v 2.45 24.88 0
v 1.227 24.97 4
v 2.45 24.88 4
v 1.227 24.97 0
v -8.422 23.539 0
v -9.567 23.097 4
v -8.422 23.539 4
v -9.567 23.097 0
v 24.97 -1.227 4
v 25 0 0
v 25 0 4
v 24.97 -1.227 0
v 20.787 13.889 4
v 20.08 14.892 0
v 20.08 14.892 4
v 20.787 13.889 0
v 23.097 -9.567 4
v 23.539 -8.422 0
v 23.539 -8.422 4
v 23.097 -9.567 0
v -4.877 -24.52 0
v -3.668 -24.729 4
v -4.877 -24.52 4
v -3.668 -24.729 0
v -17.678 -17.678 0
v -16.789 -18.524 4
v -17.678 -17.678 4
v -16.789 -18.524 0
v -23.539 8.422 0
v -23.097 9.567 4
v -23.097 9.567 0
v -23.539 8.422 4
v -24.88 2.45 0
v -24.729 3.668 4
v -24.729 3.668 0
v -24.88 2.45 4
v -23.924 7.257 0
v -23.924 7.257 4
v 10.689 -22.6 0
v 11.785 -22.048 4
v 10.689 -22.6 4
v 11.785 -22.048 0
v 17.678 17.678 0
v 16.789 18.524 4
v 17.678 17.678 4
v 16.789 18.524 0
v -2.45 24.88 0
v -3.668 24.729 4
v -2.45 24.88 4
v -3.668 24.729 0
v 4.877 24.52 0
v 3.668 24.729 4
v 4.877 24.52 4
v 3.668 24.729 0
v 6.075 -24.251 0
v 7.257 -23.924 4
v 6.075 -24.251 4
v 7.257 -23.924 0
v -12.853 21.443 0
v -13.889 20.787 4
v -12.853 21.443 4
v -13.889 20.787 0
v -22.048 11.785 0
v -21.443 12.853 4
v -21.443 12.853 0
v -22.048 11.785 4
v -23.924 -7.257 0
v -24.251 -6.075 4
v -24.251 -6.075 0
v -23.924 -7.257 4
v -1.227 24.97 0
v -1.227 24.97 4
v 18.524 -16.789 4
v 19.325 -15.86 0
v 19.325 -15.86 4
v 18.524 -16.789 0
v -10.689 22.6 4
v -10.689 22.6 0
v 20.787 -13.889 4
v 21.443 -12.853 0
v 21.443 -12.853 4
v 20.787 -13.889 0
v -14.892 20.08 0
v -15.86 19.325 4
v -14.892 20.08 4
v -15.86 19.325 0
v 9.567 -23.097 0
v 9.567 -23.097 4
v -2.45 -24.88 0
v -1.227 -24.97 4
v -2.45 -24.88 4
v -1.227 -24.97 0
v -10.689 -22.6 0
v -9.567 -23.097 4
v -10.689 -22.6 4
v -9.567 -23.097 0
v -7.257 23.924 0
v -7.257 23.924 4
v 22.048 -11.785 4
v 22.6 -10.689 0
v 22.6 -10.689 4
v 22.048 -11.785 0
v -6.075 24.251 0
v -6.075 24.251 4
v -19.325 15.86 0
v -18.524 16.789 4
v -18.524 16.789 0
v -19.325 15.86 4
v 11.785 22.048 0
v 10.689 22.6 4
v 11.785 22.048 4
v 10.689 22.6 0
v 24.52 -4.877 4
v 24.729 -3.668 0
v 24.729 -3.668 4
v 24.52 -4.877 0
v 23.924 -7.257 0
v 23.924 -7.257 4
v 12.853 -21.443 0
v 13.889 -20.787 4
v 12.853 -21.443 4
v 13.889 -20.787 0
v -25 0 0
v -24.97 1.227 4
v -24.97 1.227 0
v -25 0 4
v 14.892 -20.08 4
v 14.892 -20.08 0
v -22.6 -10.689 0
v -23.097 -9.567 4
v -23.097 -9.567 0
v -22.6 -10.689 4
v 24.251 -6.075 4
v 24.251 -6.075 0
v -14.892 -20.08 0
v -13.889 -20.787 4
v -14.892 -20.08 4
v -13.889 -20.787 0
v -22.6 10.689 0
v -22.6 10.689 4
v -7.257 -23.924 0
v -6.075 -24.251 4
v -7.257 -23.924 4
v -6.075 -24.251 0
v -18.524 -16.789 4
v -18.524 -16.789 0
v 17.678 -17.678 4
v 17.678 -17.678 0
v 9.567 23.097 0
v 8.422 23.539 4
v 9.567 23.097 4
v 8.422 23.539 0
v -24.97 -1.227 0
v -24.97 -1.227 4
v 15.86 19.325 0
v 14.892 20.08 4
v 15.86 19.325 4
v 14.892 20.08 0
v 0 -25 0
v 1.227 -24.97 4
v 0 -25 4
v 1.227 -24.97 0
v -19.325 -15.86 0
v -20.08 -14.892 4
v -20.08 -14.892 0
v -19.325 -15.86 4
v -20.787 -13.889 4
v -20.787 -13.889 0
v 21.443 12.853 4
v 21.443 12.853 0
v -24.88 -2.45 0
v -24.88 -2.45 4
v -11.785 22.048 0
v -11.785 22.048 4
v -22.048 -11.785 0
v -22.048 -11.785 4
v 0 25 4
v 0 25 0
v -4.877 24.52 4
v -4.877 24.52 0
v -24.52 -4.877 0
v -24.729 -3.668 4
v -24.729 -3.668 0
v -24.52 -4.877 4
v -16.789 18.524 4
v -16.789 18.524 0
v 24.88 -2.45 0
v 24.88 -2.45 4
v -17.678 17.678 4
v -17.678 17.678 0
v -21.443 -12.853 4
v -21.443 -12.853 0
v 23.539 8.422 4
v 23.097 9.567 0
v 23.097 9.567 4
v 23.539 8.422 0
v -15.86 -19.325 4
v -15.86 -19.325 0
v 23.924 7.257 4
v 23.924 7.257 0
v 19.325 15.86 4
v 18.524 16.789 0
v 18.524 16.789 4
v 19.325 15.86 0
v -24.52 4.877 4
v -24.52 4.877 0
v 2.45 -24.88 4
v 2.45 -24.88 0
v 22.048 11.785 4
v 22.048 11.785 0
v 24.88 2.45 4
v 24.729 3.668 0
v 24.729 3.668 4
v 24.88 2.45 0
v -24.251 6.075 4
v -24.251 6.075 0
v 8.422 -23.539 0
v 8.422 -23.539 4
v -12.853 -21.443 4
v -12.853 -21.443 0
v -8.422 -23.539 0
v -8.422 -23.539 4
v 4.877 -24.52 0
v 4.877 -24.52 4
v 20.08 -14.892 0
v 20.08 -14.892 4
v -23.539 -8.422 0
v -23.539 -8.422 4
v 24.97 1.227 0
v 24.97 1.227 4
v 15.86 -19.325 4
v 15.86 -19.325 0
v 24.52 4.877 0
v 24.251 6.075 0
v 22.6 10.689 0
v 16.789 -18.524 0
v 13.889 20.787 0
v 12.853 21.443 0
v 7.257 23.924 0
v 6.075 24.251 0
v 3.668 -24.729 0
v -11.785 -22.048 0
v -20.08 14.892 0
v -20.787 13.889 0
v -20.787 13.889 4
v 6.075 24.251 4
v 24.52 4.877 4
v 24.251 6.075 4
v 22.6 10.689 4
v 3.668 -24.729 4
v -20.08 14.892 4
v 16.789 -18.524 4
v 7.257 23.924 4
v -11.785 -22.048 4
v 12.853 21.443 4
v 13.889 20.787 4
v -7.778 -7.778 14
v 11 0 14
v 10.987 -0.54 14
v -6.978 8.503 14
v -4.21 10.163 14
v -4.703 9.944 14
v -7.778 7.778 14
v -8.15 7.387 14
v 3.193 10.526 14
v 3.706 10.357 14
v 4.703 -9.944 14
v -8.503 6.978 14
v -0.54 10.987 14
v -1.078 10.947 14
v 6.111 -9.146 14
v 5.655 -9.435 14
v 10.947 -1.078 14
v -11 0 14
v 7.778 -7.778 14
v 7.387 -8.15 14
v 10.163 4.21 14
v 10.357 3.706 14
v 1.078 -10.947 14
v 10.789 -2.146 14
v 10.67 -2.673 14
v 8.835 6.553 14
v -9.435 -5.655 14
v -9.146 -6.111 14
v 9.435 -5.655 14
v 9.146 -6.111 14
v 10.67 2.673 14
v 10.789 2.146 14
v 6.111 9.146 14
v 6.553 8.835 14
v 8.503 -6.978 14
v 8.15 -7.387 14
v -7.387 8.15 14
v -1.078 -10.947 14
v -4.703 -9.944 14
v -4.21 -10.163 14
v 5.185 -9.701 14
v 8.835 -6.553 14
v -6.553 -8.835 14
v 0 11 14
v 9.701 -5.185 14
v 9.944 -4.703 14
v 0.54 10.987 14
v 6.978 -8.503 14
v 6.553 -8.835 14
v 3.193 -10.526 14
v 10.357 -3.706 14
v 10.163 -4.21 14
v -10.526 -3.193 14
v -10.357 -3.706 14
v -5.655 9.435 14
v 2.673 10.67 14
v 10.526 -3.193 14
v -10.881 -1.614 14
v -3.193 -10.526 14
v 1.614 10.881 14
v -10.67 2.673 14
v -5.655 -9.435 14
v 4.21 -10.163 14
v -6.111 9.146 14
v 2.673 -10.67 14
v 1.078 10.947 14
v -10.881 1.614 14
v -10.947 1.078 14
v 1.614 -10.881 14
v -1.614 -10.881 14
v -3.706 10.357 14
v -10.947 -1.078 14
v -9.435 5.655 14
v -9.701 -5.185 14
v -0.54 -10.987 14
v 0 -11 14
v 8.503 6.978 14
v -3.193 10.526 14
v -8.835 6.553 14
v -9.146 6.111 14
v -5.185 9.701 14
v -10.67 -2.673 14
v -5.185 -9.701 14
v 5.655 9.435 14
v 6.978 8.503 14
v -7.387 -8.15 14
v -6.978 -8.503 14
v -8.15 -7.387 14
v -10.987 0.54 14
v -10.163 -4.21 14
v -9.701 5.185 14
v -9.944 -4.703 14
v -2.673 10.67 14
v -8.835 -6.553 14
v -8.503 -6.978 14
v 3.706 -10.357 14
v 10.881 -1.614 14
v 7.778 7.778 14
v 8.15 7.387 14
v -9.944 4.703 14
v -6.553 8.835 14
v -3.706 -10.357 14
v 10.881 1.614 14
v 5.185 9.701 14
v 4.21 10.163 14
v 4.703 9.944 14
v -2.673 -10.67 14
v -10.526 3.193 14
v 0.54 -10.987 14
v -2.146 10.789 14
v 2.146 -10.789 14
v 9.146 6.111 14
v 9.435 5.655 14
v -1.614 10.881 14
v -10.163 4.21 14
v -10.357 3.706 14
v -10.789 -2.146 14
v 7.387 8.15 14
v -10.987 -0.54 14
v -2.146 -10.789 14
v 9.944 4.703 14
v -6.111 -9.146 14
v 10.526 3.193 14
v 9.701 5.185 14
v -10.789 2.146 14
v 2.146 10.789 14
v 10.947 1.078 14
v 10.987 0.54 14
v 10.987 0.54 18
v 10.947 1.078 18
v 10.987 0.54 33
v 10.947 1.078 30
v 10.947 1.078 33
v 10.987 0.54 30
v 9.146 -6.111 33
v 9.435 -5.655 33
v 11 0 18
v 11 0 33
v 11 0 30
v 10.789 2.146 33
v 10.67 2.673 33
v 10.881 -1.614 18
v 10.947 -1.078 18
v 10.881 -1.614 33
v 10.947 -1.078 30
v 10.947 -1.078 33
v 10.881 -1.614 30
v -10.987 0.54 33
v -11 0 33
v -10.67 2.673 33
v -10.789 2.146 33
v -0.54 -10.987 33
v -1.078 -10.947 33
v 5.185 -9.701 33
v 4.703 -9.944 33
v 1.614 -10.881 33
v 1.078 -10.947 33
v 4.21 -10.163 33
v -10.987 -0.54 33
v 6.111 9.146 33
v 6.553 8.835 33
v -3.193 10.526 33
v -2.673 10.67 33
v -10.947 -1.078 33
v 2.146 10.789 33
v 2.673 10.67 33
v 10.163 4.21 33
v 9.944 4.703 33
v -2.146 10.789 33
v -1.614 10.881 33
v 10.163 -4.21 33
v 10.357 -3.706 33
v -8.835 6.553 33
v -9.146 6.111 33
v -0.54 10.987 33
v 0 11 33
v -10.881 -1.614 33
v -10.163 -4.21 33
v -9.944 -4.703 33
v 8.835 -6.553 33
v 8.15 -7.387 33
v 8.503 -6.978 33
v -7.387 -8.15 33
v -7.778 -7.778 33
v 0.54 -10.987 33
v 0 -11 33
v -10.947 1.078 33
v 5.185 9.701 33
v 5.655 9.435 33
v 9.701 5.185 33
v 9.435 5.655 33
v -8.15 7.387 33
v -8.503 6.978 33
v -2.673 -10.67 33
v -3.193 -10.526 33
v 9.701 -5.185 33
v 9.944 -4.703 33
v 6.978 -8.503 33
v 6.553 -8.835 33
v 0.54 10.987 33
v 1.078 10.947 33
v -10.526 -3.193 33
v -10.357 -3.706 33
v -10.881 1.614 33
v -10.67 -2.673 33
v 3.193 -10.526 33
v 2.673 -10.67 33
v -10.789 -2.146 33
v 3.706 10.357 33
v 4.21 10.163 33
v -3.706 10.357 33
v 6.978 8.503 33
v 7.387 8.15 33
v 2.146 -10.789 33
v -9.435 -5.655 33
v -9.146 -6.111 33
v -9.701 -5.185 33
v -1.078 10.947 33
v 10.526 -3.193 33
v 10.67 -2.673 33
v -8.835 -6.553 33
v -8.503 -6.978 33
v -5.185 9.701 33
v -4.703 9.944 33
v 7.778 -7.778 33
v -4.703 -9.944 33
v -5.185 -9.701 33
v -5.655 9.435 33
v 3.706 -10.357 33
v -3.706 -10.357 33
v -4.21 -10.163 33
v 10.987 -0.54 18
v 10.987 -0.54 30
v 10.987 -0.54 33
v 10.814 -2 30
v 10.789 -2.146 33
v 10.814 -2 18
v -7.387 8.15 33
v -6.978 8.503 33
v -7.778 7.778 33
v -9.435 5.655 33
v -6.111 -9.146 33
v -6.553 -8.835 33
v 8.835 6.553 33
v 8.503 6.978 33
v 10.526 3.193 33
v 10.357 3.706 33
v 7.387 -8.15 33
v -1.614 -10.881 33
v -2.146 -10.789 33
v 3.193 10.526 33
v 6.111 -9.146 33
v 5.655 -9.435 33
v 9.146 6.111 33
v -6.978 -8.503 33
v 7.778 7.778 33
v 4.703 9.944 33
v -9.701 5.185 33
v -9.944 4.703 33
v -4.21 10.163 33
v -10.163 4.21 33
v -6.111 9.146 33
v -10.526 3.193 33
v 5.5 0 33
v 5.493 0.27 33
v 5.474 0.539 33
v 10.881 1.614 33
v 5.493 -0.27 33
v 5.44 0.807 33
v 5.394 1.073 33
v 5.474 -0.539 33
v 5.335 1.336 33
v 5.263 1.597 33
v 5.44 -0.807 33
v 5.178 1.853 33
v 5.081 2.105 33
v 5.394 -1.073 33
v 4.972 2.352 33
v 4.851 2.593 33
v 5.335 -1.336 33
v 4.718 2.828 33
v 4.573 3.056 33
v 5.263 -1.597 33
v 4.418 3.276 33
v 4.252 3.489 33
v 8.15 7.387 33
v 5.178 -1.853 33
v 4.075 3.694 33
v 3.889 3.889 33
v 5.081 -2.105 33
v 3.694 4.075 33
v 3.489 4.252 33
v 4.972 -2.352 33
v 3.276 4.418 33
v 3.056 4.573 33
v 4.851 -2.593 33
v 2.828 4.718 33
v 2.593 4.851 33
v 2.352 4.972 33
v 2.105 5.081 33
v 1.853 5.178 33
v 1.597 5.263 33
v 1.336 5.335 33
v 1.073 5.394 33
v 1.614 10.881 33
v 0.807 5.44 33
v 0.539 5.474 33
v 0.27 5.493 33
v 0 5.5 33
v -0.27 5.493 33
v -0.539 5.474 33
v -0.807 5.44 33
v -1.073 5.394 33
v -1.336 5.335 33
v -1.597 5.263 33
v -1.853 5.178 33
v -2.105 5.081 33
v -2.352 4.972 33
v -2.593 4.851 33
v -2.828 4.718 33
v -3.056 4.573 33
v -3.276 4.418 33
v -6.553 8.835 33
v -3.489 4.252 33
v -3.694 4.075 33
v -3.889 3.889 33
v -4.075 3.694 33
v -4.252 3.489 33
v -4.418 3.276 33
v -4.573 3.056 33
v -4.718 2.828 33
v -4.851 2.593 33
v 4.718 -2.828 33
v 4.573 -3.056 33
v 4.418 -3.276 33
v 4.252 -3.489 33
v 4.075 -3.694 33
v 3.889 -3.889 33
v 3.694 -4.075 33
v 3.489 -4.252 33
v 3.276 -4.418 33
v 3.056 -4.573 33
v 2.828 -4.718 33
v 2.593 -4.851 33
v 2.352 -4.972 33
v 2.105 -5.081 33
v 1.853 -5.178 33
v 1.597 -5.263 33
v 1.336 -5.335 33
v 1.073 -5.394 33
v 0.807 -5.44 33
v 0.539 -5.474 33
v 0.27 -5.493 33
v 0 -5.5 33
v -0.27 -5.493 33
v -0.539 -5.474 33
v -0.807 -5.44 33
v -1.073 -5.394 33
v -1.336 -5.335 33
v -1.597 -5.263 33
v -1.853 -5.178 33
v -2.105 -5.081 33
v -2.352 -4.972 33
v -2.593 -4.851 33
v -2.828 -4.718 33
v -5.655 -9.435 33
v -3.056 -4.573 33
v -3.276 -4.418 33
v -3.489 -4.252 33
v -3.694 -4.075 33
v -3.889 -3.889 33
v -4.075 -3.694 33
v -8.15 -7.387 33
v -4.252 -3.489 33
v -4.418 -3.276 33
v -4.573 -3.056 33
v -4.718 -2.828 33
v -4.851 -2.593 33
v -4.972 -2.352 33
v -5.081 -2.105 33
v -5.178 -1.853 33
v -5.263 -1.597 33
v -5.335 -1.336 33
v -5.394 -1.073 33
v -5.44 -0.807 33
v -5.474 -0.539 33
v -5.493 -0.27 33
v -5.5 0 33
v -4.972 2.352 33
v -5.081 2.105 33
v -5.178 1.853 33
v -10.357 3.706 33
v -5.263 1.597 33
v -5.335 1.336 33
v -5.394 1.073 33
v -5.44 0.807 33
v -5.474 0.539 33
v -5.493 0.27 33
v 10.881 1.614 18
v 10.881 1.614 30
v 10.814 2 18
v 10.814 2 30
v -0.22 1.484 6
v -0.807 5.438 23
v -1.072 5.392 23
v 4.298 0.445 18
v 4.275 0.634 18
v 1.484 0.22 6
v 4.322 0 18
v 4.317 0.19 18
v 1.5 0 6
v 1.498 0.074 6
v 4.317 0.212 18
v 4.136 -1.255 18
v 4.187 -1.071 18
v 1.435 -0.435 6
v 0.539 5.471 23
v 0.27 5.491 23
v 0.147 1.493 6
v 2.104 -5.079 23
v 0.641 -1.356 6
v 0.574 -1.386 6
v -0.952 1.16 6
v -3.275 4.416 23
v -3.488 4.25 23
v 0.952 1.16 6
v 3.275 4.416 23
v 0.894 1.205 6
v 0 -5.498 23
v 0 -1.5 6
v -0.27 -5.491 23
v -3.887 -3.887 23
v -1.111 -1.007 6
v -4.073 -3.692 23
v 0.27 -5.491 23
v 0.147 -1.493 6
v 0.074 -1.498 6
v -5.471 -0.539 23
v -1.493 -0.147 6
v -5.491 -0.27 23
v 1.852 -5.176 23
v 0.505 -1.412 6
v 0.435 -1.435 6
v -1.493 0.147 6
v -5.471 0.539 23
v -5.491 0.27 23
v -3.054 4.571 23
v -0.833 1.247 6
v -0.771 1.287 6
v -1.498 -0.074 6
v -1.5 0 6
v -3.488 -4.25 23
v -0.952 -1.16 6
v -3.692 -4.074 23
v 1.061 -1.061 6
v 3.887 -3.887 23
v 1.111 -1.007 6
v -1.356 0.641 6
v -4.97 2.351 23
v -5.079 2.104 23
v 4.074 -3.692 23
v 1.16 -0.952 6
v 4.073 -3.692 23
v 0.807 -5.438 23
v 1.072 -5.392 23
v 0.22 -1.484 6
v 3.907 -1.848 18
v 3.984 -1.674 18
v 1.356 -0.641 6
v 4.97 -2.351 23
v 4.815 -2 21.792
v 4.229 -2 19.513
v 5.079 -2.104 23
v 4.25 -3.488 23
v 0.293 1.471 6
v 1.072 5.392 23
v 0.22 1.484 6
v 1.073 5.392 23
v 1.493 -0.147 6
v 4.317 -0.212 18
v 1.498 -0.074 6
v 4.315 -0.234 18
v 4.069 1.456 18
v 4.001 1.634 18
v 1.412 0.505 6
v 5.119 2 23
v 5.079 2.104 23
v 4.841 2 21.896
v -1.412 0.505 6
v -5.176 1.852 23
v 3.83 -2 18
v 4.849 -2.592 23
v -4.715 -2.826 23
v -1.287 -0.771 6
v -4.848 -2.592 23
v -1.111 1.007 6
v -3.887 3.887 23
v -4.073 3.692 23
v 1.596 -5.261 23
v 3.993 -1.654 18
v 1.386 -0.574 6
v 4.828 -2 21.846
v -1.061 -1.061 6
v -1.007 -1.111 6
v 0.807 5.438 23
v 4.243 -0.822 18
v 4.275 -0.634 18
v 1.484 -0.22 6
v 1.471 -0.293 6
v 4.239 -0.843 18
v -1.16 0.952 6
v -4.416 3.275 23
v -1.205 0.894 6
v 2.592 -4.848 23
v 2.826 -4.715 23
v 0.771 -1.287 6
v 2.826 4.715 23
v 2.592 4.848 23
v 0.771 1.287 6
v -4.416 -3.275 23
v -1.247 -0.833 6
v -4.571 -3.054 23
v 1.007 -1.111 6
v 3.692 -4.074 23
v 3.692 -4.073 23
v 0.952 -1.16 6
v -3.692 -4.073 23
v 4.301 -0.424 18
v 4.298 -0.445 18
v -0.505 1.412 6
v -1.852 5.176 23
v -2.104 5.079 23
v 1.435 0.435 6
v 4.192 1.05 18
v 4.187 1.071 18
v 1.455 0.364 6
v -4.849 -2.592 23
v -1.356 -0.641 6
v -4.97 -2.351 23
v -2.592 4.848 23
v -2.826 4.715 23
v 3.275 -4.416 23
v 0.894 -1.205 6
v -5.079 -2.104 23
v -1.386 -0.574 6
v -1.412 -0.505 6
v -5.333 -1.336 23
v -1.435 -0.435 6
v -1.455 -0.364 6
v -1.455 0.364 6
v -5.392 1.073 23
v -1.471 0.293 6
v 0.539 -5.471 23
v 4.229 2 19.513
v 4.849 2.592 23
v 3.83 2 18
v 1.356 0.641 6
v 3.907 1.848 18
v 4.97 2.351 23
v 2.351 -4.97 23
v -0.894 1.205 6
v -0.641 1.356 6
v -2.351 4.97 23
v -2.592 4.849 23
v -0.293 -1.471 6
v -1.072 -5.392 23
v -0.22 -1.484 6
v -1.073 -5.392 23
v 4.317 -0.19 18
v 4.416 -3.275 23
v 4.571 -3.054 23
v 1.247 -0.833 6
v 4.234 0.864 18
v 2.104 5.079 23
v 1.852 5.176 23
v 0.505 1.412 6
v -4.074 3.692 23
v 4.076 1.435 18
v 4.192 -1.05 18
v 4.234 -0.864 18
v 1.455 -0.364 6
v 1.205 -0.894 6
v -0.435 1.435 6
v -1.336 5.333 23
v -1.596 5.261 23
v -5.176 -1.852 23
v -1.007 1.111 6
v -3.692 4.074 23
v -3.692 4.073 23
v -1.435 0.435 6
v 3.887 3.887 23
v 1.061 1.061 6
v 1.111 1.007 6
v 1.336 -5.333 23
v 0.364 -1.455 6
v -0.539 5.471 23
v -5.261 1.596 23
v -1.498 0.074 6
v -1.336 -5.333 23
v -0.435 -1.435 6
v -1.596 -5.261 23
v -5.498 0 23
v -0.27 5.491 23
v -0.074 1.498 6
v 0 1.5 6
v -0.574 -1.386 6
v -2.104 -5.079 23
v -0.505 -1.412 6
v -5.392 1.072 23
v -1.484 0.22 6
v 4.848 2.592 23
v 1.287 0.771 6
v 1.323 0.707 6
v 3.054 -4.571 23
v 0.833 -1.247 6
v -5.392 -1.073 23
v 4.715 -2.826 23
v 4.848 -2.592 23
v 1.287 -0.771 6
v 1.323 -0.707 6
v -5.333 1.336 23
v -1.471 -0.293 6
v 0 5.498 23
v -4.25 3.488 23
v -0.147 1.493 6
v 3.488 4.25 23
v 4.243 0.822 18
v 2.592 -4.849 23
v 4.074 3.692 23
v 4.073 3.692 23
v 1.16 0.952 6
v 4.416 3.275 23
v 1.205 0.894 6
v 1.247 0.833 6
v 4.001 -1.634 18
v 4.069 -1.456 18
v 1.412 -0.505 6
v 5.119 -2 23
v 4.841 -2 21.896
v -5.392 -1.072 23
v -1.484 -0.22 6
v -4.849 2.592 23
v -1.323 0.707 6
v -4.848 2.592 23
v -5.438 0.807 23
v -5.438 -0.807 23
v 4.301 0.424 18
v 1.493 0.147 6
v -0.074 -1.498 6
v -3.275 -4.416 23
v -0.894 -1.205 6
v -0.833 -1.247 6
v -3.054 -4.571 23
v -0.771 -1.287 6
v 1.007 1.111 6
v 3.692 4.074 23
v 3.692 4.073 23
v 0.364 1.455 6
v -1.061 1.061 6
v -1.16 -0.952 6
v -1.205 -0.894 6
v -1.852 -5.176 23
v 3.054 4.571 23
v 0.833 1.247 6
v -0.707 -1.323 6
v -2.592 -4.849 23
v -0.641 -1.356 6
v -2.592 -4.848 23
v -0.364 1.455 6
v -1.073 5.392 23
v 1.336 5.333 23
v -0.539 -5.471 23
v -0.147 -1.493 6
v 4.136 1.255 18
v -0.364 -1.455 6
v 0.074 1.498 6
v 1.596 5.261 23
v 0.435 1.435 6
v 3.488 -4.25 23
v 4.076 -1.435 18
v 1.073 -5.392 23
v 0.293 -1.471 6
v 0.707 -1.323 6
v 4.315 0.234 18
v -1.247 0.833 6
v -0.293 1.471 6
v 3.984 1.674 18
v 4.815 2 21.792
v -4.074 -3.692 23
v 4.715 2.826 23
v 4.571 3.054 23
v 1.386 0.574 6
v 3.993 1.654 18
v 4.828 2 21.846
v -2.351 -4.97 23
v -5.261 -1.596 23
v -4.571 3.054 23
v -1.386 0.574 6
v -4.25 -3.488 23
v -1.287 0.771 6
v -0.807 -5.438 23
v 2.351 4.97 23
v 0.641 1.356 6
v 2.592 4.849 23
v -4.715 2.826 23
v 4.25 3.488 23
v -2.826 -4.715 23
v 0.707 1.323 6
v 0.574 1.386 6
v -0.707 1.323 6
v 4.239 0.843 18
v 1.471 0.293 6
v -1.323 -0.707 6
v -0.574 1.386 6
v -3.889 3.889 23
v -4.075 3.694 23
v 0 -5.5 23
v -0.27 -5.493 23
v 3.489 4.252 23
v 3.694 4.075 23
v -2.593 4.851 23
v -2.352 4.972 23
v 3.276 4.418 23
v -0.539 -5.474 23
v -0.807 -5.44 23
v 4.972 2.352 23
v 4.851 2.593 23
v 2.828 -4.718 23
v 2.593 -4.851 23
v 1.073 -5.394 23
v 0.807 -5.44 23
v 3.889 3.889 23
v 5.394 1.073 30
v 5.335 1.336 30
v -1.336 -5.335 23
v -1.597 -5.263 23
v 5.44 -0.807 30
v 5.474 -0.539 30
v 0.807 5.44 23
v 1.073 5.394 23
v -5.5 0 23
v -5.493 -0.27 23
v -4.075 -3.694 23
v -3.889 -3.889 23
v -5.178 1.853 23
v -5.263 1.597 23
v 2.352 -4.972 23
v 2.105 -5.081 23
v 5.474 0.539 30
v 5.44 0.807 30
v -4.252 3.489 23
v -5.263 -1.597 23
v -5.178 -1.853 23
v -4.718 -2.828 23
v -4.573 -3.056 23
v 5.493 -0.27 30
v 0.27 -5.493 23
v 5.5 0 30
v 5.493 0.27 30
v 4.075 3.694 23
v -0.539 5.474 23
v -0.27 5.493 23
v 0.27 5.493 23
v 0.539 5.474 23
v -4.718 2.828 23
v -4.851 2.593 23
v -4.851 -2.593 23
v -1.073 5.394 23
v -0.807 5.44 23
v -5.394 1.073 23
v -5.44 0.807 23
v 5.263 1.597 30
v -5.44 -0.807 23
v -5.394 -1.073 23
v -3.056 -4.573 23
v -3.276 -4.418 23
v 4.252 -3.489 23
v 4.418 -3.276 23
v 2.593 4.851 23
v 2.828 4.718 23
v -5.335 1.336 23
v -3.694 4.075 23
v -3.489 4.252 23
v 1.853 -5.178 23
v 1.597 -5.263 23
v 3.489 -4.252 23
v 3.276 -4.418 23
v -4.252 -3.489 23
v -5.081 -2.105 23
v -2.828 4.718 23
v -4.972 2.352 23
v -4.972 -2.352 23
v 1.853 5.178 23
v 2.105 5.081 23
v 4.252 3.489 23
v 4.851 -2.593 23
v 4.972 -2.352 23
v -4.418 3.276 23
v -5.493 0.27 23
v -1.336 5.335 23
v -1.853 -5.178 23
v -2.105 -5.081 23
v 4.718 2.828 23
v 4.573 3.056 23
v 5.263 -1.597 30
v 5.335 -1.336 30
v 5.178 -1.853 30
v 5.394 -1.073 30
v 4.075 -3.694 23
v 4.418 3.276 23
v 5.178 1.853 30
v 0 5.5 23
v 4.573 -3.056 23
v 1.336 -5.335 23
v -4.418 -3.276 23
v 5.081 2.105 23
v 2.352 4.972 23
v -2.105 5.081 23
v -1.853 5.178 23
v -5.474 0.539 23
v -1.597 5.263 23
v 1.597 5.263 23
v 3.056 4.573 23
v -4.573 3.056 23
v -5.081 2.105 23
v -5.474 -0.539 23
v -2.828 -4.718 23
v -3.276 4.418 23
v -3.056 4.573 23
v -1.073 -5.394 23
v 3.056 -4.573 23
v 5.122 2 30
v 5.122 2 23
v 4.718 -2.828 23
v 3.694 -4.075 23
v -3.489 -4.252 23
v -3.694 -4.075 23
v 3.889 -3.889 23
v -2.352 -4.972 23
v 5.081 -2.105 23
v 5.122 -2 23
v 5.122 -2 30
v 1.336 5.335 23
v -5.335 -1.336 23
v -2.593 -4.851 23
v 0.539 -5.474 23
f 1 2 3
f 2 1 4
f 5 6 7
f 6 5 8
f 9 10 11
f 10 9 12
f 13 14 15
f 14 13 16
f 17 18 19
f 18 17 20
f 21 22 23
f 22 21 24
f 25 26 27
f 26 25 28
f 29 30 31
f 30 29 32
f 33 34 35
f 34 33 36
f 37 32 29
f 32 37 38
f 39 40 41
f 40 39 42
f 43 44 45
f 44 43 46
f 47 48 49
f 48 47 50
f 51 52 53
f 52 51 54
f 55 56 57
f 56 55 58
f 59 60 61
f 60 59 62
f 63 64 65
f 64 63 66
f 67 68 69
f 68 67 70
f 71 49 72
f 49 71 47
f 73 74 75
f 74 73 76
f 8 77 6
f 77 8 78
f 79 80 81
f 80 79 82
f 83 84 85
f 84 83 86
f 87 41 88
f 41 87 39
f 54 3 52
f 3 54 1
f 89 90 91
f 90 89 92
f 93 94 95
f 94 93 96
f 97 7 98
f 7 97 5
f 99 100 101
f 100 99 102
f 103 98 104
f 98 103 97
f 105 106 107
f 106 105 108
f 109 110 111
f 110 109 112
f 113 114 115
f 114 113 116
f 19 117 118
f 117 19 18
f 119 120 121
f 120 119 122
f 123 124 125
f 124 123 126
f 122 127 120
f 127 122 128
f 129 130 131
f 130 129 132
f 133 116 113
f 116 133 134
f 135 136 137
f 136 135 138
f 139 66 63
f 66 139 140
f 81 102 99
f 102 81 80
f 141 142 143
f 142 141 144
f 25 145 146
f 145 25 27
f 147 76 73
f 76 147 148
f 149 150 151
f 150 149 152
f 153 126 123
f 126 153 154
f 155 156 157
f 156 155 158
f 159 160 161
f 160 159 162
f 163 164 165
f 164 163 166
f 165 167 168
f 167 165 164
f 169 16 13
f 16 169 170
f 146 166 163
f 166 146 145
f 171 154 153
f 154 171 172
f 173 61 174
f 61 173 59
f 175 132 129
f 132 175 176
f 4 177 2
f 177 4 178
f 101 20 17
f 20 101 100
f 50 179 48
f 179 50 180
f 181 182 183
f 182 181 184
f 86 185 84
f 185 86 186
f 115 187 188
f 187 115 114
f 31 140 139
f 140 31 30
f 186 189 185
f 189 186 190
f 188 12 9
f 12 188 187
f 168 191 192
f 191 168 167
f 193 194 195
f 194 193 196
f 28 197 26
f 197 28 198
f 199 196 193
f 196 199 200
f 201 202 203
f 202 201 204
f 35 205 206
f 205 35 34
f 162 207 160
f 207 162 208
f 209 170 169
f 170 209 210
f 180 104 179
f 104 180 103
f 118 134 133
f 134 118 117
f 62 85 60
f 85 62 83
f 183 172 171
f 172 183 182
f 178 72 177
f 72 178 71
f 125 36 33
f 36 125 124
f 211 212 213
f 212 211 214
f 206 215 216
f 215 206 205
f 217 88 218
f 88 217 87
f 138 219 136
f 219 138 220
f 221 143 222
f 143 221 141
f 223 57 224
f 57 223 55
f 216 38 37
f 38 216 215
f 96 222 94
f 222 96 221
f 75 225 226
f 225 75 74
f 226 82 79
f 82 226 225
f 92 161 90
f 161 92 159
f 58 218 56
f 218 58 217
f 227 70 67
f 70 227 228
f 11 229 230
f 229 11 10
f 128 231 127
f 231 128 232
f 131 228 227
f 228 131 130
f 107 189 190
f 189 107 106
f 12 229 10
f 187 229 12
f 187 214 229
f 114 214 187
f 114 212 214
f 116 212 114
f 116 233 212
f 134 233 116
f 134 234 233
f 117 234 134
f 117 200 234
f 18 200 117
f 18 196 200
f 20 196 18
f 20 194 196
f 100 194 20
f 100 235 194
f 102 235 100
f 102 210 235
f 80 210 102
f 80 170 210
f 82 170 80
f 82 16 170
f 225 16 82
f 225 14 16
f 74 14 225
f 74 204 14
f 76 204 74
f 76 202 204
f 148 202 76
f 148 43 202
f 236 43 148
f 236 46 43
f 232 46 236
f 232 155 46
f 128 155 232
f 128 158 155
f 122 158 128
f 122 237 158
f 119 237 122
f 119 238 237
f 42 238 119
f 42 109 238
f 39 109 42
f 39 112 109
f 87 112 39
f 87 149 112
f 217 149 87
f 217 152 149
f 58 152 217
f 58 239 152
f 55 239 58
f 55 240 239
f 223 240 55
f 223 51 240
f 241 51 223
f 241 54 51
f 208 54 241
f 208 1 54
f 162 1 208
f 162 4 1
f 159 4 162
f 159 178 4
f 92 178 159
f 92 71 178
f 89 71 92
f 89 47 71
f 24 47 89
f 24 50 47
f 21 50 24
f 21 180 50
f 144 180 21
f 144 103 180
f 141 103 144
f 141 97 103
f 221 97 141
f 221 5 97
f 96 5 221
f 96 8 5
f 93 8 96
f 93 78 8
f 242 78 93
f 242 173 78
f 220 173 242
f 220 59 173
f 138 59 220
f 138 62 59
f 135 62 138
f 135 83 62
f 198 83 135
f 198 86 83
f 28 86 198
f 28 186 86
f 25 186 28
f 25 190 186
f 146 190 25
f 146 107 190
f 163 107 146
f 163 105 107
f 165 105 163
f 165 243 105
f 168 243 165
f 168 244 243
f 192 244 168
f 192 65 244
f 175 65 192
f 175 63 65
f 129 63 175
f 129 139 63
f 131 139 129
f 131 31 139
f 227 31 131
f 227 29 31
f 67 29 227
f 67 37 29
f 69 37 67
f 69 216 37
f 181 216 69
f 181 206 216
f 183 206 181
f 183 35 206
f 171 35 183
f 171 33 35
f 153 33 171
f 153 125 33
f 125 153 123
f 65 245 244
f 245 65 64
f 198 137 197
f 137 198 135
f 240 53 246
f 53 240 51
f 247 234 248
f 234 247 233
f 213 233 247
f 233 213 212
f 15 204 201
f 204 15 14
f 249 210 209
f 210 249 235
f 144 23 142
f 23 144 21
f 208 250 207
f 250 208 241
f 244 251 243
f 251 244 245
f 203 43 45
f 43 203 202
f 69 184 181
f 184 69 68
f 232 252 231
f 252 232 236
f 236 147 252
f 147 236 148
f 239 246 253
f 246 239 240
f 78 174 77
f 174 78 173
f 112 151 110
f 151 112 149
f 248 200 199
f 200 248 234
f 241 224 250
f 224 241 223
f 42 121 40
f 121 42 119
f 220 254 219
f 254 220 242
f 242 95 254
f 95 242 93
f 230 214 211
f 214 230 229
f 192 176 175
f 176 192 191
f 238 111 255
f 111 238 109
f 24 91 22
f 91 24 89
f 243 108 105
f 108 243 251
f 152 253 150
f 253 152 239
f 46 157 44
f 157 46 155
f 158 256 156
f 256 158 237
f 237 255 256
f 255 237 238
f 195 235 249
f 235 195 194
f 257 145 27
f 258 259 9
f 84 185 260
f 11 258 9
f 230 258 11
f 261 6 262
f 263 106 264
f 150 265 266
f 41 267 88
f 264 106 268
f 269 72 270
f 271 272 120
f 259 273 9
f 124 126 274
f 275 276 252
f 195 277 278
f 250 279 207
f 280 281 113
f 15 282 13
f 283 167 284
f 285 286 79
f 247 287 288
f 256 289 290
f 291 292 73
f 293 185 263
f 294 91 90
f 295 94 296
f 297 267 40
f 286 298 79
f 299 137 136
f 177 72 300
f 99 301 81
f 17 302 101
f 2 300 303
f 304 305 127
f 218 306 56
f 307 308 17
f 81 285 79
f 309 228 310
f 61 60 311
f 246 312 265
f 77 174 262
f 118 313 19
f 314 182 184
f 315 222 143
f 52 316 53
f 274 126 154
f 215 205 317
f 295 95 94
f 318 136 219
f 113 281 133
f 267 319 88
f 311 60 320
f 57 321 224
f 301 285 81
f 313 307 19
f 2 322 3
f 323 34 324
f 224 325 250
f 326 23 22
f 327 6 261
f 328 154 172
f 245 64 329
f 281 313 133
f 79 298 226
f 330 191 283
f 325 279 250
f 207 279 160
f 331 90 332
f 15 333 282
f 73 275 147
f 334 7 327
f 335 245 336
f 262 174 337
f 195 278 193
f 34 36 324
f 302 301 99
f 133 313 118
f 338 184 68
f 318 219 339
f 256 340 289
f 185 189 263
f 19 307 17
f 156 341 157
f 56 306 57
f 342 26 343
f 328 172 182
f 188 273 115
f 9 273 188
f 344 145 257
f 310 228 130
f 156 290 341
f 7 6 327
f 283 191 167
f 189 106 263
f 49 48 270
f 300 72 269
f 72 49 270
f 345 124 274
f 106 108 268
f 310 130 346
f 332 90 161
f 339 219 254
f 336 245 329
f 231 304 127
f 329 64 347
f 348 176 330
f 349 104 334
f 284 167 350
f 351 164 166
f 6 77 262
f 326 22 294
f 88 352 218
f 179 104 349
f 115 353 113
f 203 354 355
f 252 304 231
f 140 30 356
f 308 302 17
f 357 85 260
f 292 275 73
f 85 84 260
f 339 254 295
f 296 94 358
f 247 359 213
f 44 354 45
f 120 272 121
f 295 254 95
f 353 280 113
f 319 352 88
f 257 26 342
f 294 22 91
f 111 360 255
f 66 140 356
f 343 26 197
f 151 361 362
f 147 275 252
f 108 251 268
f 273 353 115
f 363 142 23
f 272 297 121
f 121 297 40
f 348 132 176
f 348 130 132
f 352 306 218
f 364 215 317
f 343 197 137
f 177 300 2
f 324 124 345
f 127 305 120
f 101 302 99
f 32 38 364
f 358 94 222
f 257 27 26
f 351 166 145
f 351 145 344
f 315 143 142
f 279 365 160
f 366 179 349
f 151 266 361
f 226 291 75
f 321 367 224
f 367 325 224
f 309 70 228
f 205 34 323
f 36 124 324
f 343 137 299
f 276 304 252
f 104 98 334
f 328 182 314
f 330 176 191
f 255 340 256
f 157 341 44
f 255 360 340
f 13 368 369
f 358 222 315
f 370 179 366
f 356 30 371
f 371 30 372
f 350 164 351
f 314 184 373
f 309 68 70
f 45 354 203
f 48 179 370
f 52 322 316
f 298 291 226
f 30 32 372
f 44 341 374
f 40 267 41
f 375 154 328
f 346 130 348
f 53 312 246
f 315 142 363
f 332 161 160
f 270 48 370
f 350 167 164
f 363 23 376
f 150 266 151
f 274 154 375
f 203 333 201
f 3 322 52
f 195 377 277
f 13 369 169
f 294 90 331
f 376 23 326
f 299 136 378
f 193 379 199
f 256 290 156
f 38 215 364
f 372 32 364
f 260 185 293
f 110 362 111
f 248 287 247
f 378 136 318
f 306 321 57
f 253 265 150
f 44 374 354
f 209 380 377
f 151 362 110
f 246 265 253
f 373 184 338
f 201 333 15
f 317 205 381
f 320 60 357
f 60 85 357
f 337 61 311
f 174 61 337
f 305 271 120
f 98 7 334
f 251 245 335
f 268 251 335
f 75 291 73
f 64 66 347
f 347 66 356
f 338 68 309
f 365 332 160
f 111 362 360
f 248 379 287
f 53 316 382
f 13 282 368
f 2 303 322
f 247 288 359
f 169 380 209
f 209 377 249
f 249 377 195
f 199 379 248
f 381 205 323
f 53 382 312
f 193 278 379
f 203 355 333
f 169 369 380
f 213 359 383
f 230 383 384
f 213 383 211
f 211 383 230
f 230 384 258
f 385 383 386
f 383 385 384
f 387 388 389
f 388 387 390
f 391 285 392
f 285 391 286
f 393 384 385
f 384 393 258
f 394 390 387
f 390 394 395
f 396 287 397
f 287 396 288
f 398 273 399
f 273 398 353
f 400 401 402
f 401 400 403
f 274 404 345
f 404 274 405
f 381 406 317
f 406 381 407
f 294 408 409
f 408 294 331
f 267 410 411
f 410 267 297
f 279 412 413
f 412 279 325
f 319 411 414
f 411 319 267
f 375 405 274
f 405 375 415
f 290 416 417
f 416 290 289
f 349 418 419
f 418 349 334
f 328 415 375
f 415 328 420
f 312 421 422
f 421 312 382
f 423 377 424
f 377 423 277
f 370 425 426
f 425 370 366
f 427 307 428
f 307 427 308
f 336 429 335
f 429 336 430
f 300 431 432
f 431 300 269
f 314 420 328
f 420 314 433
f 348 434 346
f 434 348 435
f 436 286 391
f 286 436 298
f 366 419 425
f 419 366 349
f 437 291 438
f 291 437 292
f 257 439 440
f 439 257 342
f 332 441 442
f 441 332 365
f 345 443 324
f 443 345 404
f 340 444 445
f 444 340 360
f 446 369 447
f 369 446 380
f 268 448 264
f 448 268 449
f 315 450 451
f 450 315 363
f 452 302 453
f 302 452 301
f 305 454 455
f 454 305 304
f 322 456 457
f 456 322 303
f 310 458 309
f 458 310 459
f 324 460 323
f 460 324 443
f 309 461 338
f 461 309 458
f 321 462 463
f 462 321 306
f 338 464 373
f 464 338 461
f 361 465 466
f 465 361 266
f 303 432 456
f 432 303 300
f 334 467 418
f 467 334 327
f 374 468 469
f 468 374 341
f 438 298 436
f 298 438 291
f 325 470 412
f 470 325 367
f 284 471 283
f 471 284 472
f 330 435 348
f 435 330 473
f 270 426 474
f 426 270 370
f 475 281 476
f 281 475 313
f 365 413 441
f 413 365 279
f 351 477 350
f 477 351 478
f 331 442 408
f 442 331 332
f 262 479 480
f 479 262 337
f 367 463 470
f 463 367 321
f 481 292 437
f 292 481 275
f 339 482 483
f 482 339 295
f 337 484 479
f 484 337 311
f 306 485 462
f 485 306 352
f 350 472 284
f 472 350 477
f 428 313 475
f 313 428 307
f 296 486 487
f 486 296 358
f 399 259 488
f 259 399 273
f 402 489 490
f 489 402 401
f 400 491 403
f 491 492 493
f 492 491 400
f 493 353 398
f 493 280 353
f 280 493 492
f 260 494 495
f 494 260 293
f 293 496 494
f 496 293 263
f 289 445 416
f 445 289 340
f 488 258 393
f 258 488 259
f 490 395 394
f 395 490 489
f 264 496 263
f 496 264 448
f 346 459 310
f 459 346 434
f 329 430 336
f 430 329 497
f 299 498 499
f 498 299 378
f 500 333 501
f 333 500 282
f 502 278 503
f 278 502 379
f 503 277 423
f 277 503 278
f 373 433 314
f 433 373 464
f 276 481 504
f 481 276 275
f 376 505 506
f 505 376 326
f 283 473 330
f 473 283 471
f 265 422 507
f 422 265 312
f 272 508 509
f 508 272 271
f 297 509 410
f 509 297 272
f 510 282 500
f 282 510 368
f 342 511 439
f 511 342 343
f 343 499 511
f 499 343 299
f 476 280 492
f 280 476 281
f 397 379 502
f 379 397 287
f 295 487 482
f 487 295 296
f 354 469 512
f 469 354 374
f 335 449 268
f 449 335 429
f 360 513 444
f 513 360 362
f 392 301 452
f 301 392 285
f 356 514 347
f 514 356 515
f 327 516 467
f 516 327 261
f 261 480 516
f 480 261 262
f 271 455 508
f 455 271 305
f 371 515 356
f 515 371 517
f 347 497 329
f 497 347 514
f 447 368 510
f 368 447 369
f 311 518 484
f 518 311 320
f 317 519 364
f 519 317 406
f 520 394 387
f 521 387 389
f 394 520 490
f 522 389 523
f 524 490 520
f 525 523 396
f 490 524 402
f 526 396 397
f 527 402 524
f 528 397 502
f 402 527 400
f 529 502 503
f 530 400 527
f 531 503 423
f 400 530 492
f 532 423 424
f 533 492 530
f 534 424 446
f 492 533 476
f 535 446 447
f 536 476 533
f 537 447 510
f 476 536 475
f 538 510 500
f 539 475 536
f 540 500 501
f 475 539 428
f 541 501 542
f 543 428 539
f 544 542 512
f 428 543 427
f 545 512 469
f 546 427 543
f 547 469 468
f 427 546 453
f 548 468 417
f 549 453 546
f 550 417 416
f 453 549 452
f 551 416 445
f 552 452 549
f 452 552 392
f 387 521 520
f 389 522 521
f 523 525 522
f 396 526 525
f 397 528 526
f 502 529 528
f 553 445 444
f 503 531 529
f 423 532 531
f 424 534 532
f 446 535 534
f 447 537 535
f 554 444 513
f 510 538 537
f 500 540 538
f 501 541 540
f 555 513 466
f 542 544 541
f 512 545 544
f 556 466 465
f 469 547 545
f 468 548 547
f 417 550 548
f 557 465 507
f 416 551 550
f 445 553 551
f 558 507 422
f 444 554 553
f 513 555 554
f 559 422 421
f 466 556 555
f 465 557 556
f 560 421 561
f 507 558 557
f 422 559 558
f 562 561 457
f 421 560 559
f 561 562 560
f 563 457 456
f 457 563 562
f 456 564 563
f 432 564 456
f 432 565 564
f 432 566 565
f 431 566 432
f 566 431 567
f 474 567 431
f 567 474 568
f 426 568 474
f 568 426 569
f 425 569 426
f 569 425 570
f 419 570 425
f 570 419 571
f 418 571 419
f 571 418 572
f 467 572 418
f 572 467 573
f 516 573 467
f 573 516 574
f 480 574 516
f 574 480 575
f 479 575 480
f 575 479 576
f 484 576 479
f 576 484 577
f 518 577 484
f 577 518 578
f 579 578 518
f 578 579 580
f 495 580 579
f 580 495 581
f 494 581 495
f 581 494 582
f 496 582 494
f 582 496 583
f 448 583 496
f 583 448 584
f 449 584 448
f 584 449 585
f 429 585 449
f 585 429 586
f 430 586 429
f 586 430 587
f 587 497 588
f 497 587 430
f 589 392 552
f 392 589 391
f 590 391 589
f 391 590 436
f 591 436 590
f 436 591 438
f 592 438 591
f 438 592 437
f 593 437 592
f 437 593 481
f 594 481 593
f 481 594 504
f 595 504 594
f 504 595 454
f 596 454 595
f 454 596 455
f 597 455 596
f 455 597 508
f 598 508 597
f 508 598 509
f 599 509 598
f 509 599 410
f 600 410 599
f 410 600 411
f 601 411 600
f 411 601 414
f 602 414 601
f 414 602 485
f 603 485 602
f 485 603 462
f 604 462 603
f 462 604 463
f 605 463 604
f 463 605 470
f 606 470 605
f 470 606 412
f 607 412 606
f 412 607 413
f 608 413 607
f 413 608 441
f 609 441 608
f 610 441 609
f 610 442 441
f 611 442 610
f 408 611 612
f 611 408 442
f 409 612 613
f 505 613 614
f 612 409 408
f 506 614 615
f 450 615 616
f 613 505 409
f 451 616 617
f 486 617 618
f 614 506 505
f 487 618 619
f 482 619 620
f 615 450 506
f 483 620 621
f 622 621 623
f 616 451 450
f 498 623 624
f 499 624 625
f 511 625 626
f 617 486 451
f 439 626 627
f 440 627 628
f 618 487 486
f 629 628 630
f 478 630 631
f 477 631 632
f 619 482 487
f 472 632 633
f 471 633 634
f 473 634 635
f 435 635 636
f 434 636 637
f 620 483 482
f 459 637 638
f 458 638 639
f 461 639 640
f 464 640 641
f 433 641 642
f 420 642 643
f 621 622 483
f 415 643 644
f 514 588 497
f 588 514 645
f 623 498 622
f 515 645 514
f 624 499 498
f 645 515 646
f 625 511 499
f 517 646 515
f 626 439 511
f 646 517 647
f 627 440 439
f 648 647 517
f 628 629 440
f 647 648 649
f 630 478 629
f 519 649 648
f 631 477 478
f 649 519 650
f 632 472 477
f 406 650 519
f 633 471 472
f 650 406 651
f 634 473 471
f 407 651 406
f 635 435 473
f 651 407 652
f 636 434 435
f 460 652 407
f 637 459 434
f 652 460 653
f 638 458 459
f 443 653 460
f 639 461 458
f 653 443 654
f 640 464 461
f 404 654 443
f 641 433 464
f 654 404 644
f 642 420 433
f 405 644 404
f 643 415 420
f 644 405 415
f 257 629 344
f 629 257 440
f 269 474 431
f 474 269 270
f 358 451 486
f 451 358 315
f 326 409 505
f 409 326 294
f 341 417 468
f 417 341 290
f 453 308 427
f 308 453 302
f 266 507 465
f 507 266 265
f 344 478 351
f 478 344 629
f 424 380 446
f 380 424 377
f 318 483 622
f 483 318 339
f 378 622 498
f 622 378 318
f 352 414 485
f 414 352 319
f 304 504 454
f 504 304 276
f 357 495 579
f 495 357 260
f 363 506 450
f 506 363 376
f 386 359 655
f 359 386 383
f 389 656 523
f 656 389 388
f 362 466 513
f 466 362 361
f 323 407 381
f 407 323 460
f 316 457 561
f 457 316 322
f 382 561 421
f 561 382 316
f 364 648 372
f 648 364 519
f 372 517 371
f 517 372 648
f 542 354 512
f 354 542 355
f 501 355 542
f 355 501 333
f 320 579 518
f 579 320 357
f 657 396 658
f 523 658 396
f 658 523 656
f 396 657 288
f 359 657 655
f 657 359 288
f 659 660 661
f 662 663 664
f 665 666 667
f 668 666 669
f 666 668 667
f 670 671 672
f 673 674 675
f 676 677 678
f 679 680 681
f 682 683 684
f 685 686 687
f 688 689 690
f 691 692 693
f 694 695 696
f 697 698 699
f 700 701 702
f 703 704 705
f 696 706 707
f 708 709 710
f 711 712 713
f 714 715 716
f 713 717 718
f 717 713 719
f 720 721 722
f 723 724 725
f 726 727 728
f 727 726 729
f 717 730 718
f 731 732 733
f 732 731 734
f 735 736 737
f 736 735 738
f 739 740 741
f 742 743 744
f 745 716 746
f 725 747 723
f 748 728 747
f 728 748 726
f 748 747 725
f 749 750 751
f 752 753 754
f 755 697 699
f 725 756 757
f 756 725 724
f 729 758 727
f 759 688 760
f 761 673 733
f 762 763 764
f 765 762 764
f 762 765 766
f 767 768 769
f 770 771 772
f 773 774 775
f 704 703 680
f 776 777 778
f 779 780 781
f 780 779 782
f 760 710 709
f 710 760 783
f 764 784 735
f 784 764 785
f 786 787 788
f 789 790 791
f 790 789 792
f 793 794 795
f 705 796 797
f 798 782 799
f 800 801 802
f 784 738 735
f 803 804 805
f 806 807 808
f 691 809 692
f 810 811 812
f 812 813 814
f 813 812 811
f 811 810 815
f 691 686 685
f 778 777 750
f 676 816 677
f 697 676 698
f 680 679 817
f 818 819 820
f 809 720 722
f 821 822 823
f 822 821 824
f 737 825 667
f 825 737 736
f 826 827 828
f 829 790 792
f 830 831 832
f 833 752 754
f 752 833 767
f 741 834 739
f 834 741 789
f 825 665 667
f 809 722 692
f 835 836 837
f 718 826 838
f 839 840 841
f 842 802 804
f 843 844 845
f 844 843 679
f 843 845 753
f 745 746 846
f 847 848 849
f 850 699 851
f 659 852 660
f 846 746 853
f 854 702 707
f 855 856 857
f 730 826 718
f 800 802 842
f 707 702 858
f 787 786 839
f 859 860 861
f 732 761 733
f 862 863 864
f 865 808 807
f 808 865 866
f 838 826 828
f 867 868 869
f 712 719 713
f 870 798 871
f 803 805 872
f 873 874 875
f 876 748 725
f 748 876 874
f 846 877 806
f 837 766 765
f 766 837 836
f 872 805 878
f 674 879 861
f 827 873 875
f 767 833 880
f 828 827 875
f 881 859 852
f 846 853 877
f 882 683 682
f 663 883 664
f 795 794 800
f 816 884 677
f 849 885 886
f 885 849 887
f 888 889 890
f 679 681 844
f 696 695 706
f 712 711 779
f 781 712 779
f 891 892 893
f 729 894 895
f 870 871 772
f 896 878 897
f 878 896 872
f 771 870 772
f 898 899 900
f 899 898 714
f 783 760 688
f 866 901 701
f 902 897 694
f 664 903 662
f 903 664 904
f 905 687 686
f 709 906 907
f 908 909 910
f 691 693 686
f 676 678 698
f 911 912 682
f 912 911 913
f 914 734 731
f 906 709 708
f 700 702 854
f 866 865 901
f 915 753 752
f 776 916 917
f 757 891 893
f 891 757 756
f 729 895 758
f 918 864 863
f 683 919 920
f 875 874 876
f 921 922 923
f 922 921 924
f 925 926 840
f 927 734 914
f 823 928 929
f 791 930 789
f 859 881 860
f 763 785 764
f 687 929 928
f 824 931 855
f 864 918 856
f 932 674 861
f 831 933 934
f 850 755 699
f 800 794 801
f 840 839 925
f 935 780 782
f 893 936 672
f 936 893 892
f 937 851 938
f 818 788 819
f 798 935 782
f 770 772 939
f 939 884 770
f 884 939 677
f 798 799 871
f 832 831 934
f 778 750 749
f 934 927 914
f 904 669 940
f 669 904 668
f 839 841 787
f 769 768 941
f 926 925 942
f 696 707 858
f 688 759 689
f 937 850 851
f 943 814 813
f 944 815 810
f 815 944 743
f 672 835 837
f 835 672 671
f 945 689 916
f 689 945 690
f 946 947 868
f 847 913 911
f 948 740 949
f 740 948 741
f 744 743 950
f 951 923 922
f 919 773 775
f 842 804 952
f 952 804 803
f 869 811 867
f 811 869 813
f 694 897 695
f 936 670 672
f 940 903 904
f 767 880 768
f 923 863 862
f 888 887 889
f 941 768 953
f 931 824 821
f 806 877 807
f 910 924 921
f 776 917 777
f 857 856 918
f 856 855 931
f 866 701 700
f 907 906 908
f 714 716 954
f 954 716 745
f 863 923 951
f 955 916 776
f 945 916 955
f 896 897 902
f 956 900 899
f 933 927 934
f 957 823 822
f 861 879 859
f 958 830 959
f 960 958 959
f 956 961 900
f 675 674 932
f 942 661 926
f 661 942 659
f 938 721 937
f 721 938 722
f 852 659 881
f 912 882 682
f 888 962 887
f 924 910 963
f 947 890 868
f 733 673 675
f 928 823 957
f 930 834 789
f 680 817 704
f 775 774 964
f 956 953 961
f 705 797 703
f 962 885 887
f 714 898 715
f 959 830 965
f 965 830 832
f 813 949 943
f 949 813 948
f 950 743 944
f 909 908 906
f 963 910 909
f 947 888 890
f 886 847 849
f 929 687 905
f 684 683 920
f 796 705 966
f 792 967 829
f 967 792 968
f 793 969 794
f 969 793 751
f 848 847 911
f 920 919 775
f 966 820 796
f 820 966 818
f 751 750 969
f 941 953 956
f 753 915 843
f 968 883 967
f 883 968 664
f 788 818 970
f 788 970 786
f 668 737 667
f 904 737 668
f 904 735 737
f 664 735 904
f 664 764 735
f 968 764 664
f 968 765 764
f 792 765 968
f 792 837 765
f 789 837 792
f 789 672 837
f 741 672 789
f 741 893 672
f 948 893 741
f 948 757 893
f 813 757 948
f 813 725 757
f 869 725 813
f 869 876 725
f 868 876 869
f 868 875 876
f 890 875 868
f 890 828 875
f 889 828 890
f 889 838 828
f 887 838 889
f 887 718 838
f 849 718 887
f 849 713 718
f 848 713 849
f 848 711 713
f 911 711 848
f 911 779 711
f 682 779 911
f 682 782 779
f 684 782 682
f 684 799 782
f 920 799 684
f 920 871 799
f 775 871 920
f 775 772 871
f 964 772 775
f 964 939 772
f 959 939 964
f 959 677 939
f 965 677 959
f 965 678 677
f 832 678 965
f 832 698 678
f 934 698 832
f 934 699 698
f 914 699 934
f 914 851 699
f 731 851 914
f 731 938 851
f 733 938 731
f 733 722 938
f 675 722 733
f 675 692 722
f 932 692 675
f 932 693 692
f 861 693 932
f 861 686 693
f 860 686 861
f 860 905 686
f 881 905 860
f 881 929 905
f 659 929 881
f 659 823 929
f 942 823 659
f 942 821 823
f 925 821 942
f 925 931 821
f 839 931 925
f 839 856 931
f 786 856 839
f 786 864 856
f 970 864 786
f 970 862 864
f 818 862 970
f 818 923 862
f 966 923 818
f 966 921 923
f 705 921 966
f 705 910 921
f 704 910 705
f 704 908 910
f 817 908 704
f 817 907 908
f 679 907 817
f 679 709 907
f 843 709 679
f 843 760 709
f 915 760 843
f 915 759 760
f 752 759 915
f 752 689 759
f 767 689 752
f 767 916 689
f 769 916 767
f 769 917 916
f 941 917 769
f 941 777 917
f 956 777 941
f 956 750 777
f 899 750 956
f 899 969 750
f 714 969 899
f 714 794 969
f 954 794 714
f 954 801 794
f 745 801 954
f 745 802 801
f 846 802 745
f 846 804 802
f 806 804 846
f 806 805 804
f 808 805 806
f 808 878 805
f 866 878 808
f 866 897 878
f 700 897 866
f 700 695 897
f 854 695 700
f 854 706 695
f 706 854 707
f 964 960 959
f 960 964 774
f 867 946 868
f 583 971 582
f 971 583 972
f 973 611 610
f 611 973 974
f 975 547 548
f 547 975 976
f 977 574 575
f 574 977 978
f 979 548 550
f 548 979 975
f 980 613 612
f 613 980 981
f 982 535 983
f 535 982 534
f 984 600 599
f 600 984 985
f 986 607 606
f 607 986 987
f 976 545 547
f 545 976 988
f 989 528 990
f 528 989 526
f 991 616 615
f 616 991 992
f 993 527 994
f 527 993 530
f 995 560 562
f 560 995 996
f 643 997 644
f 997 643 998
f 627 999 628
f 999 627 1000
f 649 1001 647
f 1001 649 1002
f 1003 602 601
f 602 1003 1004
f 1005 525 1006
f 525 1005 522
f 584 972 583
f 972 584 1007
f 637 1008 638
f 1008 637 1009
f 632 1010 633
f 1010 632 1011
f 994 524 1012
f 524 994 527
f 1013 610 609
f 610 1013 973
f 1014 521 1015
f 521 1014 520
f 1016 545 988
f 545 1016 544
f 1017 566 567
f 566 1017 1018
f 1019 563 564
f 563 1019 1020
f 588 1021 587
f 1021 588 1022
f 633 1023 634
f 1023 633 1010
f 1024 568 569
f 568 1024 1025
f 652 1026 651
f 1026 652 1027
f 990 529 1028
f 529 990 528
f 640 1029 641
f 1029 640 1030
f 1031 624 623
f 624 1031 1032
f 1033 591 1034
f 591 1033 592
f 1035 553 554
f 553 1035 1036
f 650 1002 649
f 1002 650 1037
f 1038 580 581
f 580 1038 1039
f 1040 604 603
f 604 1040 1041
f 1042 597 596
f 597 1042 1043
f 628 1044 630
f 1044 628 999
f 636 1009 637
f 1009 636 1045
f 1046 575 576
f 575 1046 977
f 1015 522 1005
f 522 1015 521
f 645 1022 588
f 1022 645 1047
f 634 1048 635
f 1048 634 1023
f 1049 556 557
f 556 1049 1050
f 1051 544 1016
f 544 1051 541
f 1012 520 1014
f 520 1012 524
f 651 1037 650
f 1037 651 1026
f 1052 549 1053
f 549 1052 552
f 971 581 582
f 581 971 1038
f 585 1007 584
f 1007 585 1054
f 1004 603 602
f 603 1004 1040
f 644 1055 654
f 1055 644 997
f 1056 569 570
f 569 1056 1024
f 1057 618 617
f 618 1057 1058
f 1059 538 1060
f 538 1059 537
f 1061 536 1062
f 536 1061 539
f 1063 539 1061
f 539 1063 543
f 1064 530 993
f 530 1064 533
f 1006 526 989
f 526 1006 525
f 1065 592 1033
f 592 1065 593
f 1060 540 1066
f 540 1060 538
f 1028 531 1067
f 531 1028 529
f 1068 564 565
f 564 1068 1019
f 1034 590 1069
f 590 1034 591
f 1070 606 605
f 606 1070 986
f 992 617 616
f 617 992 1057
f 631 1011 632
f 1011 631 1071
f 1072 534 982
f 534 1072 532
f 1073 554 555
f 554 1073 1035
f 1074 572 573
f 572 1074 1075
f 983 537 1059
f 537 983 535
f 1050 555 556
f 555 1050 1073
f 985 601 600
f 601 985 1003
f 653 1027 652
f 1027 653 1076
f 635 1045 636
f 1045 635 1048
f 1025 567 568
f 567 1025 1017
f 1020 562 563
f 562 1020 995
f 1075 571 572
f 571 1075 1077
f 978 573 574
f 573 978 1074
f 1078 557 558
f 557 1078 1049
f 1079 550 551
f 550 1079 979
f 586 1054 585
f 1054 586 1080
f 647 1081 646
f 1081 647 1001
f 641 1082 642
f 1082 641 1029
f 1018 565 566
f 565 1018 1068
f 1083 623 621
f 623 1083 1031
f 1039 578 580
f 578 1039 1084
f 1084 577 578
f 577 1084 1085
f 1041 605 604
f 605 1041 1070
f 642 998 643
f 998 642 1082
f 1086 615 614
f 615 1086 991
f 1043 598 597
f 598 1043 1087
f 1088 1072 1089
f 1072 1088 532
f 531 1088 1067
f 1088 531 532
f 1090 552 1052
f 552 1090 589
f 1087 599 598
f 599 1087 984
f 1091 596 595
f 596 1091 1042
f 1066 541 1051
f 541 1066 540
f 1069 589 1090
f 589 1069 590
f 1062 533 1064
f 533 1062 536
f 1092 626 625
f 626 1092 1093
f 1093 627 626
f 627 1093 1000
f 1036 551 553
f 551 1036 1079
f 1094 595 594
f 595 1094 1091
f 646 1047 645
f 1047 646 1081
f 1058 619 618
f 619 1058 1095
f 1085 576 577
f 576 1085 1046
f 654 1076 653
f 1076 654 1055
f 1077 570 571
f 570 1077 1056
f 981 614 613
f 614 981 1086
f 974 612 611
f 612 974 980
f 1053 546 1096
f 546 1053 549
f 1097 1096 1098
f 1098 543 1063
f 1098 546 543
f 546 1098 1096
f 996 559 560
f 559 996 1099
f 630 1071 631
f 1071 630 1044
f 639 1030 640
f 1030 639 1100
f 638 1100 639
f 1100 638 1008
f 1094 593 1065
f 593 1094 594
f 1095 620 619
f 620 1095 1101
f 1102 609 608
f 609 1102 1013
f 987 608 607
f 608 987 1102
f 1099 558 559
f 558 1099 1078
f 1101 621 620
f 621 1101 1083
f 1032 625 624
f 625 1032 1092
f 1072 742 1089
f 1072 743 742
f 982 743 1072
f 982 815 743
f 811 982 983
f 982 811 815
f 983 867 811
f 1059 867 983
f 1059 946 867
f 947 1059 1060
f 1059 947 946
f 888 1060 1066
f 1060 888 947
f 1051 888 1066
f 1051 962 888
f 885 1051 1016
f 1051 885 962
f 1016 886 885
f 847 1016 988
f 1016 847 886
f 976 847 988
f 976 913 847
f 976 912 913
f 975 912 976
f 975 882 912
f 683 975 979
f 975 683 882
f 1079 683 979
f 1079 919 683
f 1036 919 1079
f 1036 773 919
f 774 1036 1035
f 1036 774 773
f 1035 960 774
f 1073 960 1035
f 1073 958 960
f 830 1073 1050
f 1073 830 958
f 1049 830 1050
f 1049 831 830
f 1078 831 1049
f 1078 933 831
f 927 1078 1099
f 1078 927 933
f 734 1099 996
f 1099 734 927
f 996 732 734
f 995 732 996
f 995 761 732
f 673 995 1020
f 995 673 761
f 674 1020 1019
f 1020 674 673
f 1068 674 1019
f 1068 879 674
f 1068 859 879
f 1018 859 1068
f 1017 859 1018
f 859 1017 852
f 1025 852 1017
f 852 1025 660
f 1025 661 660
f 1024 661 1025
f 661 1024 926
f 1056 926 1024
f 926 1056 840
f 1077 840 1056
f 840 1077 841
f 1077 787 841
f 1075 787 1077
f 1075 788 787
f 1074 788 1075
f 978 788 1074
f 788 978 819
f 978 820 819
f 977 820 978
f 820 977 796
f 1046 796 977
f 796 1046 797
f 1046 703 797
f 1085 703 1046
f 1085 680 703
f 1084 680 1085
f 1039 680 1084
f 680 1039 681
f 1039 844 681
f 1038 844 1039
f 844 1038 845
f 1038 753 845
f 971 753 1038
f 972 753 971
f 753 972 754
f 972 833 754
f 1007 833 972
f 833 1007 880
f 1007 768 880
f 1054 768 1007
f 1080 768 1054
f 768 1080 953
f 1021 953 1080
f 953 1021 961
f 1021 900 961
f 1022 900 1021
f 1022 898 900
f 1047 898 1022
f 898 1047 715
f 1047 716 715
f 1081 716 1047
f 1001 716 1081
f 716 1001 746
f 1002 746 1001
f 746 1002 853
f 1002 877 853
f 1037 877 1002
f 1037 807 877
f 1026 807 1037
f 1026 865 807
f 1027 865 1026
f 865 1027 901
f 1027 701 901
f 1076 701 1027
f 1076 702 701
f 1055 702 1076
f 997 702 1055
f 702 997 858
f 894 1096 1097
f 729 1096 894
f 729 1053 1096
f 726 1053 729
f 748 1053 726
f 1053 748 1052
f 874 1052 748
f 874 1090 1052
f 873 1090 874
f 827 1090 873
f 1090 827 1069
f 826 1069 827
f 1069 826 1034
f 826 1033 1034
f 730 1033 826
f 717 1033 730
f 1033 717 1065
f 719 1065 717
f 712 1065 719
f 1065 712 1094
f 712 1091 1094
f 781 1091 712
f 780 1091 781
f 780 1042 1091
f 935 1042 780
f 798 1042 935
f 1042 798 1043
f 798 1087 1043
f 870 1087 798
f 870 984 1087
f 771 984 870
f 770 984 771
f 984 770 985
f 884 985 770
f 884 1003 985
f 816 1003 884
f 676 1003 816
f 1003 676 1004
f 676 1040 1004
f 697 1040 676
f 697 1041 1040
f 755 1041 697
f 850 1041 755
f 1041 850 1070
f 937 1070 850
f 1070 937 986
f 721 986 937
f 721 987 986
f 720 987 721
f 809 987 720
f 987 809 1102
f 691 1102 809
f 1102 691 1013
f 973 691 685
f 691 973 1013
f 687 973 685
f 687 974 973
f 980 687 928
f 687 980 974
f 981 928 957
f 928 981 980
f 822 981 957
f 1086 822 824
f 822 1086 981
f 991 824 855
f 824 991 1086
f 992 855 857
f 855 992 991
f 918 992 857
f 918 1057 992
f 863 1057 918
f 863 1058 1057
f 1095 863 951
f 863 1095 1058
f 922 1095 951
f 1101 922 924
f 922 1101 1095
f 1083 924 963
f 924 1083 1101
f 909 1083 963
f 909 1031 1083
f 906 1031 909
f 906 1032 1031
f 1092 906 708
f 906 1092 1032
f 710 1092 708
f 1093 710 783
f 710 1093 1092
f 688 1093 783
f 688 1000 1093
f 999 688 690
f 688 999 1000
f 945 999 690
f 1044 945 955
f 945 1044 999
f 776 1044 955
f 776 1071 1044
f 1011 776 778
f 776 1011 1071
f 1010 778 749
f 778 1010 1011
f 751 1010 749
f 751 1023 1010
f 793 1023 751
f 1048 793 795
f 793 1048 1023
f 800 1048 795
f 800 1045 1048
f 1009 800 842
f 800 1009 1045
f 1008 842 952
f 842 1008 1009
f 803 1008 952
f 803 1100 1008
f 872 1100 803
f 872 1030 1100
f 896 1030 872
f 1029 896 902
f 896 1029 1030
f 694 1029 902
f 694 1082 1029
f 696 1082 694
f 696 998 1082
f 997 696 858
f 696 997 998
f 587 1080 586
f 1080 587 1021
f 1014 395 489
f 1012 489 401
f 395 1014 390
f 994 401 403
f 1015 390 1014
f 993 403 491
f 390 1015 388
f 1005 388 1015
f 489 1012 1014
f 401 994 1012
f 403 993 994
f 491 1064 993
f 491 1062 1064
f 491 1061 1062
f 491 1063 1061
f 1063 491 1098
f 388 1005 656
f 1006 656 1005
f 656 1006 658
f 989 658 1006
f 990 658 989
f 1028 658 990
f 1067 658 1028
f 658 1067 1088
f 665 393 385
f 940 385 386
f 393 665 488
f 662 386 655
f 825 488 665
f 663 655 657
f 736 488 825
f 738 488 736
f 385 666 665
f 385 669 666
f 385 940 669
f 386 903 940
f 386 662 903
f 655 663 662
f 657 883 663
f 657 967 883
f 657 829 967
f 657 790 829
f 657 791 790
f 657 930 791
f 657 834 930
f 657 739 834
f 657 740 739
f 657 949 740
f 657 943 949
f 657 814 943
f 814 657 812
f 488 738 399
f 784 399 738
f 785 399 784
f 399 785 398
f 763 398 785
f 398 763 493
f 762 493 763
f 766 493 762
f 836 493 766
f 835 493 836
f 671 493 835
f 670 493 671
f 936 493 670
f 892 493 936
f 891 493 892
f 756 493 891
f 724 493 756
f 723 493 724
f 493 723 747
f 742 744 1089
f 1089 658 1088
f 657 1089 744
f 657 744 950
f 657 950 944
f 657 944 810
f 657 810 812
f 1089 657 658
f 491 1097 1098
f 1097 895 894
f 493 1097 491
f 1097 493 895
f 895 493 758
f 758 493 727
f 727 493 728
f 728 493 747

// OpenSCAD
// KNOWN-RIGHT ALTERNATIVE (must pass): a correct part coded independently, stacked linear_extrude()s, the cone by scale
$fn=128;
difference(){ union(){ linear_extrude(4) circle(d=50); translate([0,0,4]) linear_extrude(10, scale=22/50) circle(d=50); translate([0,0,14]) linear_extrude(19) circle(d=22); }
 translate([0,0,6]) cylinder(d1=3,d2=11,h=17.01); translate([0,0,23]) cylinder(d=11,h=11);
 translate([0,-2,18]) cube([12,4,12]); }
